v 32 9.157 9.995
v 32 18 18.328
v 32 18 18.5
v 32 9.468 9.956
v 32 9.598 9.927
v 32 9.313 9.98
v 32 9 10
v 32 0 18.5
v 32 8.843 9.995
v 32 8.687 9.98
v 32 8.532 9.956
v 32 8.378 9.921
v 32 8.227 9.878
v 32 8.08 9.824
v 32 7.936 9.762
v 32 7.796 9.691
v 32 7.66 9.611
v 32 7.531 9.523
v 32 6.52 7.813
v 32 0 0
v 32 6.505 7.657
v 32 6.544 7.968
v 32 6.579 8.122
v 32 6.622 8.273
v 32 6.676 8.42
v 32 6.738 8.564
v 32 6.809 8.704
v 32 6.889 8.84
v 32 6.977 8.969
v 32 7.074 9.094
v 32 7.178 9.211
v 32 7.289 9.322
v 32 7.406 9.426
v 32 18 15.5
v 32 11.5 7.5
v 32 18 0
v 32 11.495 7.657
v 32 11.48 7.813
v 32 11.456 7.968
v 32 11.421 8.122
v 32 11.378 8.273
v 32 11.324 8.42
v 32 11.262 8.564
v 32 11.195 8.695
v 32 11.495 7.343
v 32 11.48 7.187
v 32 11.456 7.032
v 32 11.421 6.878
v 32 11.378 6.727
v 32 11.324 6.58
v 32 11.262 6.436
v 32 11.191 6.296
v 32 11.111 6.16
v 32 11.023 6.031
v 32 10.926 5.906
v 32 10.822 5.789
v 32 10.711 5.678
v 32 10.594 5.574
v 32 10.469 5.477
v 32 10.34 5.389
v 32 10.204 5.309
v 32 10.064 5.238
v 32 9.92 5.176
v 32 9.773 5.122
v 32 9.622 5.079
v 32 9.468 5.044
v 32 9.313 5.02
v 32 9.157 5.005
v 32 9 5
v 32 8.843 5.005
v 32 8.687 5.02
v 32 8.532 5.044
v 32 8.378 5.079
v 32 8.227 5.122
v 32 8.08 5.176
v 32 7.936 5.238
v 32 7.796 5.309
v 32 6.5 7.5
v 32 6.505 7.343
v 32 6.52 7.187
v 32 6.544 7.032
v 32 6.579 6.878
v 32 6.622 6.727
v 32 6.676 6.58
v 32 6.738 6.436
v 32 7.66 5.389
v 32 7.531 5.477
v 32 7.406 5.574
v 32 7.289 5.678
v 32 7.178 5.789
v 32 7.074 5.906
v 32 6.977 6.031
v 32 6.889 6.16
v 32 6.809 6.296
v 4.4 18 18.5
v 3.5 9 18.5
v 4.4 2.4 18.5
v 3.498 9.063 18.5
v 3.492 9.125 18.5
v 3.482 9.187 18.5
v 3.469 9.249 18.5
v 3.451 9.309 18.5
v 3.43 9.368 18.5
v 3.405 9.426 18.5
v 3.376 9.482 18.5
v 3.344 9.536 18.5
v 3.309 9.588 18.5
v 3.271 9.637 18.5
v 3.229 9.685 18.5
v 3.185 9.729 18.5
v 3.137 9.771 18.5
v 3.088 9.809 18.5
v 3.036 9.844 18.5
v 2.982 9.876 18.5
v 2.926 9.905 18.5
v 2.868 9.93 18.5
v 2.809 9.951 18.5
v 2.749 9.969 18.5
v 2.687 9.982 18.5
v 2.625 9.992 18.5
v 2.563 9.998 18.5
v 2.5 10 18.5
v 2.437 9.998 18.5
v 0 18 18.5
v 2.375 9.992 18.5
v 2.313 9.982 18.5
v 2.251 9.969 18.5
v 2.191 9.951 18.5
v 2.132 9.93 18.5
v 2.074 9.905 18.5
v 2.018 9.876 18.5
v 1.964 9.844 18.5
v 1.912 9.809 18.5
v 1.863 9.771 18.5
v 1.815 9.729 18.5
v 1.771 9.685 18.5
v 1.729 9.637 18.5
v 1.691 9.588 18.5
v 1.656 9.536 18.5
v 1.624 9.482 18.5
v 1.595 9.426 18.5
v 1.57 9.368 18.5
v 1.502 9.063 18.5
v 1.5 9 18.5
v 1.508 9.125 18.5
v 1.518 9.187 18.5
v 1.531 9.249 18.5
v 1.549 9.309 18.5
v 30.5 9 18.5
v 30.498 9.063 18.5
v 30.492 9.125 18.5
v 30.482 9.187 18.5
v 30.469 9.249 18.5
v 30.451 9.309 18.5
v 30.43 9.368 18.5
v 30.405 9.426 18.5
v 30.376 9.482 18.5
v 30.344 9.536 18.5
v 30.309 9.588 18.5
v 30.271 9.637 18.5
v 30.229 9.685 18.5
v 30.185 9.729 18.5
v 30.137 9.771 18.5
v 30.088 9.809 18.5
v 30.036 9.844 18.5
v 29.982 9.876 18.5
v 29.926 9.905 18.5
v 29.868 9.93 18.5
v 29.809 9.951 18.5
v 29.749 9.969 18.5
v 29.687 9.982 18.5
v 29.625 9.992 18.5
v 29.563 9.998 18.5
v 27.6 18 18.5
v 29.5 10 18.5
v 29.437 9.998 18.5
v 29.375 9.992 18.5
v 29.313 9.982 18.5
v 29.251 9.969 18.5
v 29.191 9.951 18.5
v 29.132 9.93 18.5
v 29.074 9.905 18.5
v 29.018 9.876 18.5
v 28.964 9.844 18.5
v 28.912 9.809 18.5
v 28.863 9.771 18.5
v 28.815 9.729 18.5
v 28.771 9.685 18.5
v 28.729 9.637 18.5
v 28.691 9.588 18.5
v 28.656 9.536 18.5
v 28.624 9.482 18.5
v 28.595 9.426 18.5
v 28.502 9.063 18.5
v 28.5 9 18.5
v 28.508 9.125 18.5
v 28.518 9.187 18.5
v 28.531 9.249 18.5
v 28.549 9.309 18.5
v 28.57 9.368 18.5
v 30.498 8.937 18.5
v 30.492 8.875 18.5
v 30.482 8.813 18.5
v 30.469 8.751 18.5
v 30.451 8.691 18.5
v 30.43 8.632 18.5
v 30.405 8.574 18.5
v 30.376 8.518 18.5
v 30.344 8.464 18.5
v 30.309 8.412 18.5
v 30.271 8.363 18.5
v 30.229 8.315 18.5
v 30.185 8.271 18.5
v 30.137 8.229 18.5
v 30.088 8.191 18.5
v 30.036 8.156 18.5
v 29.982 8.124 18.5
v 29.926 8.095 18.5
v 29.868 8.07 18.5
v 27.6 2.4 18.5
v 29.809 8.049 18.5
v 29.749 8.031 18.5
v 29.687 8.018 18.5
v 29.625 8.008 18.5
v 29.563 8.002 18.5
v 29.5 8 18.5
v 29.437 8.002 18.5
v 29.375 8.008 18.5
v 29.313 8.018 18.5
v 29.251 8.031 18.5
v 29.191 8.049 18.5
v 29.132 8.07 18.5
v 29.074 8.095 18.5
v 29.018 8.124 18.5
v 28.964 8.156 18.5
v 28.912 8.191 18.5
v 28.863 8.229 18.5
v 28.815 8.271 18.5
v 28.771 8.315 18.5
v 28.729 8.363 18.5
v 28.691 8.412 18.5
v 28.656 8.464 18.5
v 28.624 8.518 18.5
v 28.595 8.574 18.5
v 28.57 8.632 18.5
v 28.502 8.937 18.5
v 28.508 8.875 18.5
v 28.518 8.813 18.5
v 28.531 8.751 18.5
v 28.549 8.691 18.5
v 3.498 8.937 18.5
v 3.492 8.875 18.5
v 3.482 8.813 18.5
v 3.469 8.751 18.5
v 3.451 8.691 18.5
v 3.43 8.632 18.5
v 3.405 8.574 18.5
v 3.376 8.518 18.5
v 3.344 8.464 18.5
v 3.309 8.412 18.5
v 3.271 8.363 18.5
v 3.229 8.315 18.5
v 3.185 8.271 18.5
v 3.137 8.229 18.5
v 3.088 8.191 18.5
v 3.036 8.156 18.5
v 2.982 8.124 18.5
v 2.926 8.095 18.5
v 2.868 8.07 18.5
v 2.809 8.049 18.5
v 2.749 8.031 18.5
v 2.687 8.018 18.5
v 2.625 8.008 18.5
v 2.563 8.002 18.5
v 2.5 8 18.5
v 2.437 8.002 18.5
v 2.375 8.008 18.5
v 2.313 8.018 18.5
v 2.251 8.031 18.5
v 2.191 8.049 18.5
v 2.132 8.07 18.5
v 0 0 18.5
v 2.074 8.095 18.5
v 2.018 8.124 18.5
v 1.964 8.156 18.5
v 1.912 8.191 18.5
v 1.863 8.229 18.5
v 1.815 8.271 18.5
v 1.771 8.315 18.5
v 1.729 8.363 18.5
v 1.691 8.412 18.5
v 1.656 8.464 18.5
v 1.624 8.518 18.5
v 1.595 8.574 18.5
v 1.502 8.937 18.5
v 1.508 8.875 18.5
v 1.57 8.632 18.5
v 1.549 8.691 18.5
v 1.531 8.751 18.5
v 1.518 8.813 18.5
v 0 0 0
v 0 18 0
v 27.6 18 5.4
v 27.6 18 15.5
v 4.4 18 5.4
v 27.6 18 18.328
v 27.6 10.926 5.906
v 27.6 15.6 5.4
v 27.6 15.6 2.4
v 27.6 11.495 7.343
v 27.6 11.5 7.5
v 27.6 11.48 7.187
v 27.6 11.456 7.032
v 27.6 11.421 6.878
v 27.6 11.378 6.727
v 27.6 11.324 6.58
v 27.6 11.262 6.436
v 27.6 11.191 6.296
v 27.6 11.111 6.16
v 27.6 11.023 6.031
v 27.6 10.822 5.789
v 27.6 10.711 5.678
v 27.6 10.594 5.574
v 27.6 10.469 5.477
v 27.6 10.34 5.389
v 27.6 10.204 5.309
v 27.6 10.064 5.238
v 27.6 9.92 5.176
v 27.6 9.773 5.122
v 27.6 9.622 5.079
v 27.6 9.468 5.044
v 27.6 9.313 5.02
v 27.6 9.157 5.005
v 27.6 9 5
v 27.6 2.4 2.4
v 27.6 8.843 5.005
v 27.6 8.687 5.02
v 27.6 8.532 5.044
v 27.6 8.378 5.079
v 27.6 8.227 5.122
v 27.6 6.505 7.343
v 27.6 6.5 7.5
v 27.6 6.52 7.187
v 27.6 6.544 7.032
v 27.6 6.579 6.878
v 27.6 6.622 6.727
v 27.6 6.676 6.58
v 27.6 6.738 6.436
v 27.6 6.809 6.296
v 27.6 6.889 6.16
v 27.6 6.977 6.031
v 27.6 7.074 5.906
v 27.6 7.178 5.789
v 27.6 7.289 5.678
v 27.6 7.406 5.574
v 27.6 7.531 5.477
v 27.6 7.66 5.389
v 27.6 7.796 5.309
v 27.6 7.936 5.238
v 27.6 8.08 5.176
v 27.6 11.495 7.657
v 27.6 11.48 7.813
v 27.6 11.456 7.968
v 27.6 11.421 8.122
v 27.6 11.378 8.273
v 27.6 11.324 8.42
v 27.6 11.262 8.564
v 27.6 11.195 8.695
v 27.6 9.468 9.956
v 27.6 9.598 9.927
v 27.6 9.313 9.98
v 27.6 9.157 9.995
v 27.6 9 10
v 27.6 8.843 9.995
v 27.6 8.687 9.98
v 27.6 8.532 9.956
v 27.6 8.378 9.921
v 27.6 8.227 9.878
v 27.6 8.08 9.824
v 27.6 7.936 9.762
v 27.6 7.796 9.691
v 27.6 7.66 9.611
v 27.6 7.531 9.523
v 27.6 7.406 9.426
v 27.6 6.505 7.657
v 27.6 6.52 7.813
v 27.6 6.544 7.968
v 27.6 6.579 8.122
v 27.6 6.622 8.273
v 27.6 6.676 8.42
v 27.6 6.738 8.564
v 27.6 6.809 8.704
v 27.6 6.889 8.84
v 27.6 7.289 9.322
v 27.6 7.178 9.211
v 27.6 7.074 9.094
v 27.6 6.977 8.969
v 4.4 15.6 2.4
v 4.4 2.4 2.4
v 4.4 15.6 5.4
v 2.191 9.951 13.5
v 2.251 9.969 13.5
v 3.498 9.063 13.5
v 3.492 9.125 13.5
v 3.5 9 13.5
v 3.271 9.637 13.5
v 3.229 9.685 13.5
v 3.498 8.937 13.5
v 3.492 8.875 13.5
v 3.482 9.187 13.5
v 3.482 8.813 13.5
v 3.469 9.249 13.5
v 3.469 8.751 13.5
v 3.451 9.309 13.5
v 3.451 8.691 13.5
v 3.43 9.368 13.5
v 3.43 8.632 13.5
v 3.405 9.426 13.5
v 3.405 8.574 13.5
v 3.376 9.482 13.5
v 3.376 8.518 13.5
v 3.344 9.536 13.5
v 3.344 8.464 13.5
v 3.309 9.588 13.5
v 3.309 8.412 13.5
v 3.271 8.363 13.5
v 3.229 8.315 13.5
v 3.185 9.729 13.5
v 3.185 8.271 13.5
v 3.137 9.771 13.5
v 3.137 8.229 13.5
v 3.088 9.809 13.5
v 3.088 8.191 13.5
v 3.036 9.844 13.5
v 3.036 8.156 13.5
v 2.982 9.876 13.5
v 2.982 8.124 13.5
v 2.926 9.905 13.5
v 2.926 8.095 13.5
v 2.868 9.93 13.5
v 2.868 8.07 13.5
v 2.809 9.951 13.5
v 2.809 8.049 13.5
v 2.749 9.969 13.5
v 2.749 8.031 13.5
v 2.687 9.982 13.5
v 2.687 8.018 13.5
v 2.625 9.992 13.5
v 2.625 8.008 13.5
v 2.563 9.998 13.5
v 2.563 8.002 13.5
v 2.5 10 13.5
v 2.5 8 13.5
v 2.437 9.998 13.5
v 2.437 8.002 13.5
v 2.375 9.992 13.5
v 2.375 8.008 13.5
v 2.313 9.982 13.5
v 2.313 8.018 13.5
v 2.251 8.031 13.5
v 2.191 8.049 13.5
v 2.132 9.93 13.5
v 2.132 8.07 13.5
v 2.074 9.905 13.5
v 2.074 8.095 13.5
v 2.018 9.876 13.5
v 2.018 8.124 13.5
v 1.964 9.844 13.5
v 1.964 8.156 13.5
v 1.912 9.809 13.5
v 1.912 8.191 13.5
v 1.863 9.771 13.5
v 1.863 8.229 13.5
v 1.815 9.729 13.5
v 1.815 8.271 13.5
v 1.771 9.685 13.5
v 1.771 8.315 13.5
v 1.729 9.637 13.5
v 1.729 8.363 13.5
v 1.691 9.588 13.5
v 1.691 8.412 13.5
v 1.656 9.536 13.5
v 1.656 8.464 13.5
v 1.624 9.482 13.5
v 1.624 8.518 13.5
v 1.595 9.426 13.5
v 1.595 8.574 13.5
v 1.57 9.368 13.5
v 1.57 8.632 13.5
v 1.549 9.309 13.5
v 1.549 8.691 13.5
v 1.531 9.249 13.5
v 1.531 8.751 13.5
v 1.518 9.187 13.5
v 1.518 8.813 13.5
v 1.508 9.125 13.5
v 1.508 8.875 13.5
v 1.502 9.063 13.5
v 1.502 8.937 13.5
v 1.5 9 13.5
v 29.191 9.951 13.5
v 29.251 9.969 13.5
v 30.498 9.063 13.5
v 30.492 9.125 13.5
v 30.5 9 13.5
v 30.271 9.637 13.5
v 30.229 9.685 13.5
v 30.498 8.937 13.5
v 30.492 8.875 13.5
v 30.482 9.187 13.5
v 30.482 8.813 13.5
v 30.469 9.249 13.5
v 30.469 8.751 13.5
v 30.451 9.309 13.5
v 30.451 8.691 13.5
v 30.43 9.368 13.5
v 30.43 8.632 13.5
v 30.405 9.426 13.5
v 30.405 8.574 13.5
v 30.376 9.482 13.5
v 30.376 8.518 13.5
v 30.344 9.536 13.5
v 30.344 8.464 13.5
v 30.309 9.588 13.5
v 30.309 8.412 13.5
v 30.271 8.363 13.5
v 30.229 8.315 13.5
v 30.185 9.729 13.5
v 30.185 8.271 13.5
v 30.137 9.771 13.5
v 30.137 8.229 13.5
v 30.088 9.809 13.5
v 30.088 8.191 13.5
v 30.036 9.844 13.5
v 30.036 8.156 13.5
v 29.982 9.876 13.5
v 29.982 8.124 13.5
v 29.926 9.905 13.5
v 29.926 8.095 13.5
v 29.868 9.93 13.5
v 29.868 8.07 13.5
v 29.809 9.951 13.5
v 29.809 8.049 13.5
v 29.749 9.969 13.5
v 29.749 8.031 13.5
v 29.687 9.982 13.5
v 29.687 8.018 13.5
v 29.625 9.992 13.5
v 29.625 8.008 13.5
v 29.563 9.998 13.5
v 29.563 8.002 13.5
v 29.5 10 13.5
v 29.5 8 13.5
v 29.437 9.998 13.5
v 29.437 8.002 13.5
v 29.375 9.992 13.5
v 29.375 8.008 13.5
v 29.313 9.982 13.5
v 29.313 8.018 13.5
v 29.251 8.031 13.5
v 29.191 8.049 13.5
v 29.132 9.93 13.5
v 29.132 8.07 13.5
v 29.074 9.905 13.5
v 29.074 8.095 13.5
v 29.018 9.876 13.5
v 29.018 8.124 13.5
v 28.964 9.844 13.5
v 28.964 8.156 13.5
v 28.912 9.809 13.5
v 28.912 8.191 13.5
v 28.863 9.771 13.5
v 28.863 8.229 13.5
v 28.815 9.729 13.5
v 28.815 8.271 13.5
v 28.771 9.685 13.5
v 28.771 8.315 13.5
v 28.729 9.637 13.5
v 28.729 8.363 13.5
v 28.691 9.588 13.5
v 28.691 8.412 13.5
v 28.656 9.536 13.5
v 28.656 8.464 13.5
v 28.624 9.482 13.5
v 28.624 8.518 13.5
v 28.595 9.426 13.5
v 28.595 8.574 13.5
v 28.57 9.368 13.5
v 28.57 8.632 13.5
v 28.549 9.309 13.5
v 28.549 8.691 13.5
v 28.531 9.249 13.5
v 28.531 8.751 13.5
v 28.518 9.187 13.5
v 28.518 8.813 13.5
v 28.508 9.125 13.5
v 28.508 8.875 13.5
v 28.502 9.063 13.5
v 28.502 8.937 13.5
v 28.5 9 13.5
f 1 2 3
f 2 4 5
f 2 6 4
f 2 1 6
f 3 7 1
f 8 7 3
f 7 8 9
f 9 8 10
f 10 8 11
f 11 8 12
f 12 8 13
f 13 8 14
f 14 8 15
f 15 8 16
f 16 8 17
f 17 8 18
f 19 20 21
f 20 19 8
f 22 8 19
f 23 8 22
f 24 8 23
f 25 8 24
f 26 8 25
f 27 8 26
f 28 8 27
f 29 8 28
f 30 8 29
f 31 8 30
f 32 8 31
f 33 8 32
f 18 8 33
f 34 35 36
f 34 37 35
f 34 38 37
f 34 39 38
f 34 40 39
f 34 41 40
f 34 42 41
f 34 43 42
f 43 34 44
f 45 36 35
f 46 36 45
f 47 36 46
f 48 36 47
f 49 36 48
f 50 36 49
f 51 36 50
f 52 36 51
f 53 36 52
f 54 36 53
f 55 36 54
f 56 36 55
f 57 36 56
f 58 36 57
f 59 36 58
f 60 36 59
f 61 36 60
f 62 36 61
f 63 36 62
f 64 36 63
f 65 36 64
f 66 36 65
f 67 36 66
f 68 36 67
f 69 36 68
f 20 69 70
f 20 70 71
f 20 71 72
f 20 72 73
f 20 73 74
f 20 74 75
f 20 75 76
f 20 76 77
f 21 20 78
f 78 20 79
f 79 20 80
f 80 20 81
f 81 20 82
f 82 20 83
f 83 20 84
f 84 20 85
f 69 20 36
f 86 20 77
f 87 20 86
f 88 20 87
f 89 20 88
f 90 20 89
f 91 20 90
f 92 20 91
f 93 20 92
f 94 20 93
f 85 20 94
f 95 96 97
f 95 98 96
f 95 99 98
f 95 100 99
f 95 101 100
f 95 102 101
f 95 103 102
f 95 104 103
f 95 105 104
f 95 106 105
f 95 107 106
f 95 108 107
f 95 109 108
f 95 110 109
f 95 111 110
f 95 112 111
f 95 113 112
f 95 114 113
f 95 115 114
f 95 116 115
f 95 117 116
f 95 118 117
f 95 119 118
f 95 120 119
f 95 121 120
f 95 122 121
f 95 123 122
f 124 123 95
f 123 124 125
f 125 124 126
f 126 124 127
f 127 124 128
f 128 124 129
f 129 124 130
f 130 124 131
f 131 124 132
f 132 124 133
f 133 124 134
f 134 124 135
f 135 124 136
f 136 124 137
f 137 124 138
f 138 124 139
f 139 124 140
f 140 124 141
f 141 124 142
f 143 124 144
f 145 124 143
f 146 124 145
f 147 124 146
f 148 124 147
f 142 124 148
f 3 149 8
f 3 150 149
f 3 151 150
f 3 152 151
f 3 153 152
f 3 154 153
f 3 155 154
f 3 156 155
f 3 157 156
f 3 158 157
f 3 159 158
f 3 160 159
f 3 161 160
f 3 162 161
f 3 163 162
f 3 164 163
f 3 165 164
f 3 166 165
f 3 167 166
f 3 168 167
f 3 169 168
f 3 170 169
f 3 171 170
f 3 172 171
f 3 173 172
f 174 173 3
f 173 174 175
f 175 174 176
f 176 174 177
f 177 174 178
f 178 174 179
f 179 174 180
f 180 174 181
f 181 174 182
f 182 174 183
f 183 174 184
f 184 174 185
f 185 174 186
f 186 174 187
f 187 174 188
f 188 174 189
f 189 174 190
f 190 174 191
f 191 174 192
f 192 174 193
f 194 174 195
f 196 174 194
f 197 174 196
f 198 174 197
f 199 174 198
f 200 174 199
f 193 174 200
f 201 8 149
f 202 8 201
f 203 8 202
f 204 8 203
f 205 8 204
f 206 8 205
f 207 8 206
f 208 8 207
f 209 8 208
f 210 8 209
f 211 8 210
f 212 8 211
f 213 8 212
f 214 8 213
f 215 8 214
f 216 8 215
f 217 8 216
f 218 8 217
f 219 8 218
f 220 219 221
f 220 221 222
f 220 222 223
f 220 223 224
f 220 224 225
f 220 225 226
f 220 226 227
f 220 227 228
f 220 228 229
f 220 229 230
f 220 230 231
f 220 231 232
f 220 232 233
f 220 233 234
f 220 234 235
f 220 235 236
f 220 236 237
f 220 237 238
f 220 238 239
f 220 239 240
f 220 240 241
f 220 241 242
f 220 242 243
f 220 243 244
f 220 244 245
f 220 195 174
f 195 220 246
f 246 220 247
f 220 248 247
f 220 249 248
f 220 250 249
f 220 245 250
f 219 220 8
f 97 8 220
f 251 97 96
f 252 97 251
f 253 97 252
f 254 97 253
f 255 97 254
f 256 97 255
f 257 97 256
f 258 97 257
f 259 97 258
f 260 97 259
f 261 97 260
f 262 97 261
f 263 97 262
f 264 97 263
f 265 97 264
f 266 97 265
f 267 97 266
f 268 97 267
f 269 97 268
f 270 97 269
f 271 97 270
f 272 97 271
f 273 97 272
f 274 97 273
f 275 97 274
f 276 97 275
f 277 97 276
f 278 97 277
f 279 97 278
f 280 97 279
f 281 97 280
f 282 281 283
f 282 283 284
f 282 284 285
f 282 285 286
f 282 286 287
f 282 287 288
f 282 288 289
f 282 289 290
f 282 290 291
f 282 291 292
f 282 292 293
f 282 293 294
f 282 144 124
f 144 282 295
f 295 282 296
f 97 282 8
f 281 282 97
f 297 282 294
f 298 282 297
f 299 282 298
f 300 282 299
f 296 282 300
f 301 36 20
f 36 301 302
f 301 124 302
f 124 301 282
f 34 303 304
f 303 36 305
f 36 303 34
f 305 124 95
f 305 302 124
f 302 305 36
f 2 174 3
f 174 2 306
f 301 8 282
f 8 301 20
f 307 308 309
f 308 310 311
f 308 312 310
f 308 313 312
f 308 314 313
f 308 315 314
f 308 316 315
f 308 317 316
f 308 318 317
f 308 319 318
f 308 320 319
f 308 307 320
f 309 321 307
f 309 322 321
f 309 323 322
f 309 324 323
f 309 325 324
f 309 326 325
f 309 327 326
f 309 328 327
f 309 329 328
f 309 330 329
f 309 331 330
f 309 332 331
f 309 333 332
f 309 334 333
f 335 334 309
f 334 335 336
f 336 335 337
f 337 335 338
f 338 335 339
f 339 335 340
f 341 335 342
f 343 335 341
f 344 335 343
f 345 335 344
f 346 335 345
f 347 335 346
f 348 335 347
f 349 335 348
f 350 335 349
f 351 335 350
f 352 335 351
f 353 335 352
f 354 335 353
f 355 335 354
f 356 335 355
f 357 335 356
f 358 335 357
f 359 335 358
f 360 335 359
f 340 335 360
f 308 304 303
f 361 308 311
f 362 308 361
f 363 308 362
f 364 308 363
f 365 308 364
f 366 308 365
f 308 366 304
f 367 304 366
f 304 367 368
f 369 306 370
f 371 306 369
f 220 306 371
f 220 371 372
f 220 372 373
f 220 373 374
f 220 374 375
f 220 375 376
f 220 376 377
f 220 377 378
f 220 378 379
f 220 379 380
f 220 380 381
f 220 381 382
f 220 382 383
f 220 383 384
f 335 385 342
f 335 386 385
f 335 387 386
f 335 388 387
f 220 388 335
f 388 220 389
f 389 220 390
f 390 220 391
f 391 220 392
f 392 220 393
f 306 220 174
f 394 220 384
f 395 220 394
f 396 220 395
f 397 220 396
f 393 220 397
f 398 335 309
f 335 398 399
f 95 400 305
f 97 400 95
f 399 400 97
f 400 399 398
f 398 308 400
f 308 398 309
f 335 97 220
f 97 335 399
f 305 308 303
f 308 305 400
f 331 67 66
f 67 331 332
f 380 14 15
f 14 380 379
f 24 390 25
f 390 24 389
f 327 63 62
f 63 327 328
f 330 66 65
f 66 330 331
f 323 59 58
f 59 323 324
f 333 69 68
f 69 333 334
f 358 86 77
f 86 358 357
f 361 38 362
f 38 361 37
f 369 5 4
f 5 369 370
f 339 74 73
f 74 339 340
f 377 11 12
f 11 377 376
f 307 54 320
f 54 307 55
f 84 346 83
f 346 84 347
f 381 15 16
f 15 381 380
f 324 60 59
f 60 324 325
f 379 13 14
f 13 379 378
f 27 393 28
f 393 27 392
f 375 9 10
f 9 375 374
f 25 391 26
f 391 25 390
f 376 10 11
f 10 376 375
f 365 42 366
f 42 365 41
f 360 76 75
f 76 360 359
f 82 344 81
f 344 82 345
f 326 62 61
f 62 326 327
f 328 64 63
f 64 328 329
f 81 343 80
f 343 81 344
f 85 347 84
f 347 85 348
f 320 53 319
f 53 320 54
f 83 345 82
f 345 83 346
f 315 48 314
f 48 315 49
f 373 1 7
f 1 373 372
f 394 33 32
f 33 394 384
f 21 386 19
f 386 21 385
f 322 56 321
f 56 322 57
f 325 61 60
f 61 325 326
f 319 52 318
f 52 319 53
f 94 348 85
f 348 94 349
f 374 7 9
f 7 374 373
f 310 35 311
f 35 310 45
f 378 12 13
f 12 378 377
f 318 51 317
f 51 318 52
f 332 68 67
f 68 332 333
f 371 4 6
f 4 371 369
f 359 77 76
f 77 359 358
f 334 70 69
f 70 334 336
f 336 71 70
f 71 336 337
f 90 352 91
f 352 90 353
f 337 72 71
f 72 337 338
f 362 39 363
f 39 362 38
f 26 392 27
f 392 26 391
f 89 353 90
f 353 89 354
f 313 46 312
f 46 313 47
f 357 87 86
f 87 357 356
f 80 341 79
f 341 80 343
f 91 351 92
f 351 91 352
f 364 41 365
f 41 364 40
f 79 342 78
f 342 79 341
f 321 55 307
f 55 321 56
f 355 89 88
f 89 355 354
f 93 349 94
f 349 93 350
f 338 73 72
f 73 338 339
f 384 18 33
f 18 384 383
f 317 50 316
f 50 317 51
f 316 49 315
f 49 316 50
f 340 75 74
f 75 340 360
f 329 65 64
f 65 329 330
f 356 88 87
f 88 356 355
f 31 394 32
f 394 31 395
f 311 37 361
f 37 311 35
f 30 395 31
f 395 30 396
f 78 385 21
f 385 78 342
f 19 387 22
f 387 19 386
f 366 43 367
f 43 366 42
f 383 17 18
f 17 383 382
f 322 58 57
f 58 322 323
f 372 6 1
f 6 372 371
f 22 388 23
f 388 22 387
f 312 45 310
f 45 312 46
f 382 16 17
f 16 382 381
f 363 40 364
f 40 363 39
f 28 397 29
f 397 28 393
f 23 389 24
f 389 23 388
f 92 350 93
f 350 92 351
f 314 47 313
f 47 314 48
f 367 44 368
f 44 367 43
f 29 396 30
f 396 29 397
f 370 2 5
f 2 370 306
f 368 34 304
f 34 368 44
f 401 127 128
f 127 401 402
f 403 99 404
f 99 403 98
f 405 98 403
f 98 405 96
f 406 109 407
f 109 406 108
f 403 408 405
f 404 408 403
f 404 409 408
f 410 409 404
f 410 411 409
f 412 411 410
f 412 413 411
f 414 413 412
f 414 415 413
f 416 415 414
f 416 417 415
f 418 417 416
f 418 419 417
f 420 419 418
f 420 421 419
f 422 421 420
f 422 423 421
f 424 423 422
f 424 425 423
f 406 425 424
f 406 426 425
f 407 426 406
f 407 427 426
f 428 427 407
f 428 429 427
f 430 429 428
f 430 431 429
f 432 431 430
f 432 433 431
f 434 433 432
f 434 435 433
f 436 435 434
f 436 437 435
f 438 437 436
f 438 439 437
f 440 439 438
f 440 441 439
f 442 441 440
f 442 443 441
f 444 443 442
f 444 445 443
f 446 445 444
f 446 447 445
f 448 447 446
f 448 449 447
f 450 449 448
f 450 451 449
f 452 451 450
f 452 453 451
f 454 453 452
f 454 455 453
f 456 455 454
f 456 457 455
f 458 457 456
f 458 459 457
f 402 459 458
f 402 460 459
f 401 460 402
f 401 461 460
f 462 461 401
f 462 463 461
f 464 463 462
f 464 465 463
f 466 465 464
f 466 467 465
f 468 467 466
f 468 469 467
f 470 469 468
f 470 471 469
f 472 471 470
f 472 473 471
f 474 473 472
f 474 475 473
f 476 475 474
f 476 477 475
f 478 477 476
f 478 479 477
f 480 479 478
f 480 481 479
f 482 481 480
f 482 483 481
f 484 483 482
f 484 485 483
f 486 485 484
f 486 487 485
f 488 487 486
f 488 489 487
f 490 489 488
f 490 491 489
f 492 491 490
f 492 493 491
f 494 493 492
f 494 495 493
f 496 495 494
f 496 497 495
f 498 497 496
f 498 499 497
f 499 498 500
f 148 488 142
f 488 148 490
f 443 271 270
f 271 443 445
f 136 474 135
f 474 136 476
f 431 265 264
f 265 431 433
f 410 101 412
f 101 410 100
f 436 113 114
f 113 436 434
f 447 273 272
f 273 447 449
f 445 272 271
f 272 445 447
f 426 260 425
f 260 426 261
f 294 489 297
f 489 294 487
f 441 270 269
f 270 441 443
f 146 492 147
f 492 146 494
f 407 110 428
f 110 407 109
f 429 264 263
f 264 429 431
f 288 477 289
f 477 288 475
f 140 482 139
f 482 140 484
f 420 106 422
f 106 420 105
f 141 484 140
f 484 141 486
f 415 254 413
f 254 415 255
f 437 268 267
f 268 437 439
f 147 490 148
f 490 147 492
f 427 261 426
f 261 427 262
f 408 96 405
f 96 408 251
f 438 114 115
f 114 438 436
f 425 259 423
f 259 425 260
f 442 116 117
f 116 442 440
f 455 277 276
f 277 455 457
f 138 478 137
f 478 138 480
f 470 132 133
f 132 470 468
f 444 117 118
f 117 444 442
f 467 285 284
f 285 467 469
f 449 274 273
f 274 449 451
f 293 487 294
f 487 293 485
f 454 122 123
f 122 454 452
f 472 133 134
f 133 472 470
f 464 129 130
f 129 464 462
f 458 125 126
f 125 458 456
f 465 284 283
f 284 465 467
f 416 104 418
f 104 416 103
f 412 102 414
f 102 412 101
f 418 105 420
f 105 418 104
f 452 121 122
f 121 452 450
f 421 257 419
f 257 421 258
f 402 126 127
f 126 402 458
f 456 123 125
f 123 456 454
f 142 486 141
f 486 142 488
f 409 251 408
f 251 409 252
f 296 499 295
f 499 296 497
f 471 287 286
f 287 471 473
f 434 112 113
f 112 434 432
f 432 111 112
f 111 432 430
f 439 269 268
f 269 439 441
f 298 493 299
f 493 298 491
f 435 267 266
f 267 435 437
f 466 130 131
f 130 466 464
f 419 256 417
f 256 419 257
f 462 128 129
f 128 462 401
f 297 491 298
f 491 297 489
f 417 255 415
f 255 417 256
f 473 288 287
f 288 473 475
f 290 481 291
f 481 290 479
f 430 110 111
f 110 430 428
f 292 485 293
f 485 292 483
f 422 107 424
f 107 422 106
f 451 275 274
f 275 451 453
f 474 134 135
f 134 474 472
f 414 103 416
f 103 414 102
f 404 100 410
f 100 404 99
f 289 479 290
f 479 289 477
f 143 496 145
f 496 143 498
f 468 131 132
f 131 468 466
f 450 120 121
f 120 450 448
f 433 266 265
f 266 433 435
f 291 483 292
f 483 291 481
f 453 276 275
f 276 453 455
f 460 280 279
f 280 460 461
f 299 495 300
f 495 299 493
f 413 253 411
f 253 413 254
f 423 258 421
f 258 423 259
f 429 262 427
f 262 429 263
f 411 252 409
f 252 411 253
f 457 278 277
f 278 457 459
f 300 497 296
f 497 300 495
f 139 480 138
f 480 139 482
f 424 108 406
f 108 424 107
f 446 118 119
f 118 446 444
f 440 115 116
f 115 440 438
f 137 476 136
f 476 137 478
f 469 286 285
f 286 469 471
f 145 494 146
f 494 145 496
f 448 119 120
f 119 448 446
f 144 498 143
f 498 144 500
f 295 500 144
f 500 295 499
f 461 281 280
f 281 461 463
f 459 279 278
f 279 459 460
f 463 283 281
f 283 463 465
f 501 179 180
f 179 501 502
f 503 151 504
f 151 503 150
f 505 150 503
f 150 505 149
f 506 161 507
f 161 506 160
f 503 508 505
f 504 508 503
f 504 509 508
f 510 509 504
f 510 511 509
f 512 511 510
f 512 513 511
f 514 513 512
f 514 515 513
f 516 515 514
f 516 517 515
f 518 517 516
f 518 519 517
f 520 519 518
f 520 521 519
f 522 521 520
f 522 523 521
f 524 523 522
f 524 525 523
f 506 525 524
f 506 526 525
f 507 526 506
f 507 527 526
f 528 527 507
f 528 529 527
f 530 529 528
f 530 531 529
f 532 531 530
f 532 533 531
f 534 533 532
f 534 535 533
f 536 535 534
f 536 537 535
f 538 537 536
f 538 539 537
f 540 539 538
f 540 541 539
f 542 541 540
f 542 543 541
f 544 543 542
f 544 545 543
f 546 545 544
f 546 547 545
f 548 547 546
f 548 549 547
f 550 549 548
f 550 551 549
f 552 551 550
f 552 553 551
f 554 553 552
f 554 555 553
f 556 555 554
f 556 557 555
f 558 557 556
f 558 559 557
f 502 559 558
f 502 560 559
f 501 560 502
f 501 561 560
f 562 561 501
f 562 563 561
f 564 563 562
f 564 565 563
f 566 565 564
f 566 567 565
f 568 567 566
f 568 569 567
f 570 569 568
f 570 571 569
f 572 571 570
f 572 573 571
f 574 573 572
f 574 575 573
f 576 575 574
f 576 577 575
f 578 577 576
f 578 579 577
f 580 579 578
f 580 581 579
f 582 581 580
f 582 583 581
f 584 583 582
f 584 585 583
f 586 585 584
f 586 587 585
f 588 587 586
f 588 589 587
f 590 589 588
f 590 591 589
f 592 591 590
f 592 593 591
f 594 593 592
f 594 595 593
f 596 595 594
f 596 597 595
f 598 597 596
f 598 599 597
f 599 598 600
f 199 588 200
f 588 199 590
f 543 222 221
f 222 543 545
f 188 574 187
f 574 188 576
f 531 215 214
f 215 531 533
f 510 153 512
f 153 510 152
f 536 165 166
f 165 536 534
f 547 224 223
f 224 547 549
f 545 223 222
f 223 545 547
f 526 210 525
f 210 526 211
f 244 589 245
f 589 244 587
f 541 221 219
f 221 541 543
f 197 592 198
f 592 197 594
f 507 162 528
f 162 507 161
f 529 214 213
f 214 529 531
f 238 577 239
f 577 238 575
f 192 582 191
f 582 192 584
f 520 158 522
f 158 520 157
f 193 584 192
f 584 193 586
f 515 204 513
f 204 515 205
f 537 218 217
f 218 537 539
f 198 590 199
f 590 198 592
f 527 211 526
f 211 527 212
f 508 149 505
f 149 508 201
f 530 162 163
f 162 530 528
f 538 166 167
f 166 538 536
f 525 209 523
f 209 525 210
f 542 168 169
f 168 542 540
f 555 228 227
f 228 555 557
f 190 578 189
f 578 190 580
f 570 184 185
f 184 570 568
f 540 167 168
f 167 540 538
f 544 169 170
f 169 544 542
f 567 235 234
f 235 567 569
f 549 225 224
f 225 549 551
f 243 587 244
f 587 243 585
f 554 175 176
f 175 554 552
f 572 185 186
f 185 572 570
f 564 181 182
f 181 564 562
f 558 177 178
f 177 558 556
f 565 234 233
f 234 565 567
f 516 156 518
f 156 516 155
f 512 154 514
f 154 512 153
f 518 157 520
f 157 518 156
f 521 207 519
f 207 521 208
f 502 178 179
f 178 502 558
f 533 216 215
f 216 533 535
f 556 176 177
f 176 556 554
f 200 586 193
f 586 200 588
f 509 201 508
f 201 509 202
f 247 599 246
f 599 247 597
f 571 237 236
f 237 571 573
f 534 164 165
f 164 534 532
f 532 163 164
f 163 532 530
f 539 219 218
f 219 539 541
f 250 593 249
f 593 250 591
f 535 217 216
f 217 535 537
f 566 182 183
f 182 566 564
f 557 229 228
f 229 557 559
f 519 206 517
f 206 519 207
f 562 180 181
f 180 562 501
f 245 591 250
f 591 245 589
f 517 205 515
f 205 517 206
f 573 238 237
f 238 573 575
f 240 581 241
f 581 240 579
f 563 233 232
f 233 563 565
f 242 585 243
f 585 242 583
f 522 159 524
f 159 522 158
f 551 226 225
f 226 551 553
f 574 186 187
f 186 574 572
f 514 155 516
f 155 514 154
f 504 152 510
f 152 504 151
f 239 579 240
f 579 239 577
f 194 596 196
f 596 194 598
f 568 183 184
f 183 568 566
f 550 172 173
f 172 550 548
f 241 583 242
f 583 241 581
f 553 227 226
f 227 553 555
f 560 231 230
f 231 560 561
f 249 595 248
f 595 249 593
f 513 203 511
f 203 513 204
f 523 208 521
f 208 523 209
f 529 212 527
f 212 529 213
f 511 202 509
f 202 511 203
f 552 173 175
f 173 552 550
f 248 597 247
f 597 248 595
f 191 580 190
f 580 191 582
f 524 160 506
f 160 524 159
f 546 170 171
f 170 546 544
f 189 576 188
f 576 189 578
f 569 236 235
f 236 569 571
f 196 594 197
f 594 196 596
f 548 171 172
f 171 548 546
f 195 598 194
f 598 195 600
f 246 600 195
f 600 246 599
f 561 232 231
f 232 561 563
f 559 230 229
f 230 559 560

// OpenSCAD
$fn=100;

// Thickness
th_b = 3; //bottom
th_s = 5; // sides
th_d = 3; // depth
box_w = 22;
box_d = 12;
box_h = 15.5;
// Screw radius
sr = 1.1;
sh = 5;
// Screw center to screw center
sc2sc = 27.5;
sc2c = 8.5; // (closest) screw to center
margin = 0.6;

module servo_support() {
	difference() {
		// Outer
		cube([box_w+th_s*2,box_d+th_d*2,box_h+th_b]);
		// Inner
		translate([th_s-margin,th_d-margin,th_b-margin])
		cube([box_w+2*margin,box_d+2*margin,box_h+10]);
		translate([th_s-margin,th_d-margin,th_b*2-margin])
		cube([box_w+2*margin,box_d+10,box_h+10]);

		// Cables...
		translate([box_w+th_s-1,box_d/2+th_d,4.5+th_b])
		rotate([0,90,0])
		cylinder(r=2.5,h=th_s+2);

		translate([box_w+th_s-1,box_d/2+th_d,3.5+th_b])
		rotate([45,0,0])
		cube([th_s+2,box_d*2,2]);

		// Screws
		translate([th_s/2,box_d/2+th_d,box_h+th_b-sh])
		cylinder(r=sr-0.1,h=sh);
		
		translate([th_s+box_w,0,0])
		translate([th_s/2,box_d/2+th_d,box_h+th_b-sh])
		cylinder(r=sr-0.1,h=sh);


	}
}

servo_support();
